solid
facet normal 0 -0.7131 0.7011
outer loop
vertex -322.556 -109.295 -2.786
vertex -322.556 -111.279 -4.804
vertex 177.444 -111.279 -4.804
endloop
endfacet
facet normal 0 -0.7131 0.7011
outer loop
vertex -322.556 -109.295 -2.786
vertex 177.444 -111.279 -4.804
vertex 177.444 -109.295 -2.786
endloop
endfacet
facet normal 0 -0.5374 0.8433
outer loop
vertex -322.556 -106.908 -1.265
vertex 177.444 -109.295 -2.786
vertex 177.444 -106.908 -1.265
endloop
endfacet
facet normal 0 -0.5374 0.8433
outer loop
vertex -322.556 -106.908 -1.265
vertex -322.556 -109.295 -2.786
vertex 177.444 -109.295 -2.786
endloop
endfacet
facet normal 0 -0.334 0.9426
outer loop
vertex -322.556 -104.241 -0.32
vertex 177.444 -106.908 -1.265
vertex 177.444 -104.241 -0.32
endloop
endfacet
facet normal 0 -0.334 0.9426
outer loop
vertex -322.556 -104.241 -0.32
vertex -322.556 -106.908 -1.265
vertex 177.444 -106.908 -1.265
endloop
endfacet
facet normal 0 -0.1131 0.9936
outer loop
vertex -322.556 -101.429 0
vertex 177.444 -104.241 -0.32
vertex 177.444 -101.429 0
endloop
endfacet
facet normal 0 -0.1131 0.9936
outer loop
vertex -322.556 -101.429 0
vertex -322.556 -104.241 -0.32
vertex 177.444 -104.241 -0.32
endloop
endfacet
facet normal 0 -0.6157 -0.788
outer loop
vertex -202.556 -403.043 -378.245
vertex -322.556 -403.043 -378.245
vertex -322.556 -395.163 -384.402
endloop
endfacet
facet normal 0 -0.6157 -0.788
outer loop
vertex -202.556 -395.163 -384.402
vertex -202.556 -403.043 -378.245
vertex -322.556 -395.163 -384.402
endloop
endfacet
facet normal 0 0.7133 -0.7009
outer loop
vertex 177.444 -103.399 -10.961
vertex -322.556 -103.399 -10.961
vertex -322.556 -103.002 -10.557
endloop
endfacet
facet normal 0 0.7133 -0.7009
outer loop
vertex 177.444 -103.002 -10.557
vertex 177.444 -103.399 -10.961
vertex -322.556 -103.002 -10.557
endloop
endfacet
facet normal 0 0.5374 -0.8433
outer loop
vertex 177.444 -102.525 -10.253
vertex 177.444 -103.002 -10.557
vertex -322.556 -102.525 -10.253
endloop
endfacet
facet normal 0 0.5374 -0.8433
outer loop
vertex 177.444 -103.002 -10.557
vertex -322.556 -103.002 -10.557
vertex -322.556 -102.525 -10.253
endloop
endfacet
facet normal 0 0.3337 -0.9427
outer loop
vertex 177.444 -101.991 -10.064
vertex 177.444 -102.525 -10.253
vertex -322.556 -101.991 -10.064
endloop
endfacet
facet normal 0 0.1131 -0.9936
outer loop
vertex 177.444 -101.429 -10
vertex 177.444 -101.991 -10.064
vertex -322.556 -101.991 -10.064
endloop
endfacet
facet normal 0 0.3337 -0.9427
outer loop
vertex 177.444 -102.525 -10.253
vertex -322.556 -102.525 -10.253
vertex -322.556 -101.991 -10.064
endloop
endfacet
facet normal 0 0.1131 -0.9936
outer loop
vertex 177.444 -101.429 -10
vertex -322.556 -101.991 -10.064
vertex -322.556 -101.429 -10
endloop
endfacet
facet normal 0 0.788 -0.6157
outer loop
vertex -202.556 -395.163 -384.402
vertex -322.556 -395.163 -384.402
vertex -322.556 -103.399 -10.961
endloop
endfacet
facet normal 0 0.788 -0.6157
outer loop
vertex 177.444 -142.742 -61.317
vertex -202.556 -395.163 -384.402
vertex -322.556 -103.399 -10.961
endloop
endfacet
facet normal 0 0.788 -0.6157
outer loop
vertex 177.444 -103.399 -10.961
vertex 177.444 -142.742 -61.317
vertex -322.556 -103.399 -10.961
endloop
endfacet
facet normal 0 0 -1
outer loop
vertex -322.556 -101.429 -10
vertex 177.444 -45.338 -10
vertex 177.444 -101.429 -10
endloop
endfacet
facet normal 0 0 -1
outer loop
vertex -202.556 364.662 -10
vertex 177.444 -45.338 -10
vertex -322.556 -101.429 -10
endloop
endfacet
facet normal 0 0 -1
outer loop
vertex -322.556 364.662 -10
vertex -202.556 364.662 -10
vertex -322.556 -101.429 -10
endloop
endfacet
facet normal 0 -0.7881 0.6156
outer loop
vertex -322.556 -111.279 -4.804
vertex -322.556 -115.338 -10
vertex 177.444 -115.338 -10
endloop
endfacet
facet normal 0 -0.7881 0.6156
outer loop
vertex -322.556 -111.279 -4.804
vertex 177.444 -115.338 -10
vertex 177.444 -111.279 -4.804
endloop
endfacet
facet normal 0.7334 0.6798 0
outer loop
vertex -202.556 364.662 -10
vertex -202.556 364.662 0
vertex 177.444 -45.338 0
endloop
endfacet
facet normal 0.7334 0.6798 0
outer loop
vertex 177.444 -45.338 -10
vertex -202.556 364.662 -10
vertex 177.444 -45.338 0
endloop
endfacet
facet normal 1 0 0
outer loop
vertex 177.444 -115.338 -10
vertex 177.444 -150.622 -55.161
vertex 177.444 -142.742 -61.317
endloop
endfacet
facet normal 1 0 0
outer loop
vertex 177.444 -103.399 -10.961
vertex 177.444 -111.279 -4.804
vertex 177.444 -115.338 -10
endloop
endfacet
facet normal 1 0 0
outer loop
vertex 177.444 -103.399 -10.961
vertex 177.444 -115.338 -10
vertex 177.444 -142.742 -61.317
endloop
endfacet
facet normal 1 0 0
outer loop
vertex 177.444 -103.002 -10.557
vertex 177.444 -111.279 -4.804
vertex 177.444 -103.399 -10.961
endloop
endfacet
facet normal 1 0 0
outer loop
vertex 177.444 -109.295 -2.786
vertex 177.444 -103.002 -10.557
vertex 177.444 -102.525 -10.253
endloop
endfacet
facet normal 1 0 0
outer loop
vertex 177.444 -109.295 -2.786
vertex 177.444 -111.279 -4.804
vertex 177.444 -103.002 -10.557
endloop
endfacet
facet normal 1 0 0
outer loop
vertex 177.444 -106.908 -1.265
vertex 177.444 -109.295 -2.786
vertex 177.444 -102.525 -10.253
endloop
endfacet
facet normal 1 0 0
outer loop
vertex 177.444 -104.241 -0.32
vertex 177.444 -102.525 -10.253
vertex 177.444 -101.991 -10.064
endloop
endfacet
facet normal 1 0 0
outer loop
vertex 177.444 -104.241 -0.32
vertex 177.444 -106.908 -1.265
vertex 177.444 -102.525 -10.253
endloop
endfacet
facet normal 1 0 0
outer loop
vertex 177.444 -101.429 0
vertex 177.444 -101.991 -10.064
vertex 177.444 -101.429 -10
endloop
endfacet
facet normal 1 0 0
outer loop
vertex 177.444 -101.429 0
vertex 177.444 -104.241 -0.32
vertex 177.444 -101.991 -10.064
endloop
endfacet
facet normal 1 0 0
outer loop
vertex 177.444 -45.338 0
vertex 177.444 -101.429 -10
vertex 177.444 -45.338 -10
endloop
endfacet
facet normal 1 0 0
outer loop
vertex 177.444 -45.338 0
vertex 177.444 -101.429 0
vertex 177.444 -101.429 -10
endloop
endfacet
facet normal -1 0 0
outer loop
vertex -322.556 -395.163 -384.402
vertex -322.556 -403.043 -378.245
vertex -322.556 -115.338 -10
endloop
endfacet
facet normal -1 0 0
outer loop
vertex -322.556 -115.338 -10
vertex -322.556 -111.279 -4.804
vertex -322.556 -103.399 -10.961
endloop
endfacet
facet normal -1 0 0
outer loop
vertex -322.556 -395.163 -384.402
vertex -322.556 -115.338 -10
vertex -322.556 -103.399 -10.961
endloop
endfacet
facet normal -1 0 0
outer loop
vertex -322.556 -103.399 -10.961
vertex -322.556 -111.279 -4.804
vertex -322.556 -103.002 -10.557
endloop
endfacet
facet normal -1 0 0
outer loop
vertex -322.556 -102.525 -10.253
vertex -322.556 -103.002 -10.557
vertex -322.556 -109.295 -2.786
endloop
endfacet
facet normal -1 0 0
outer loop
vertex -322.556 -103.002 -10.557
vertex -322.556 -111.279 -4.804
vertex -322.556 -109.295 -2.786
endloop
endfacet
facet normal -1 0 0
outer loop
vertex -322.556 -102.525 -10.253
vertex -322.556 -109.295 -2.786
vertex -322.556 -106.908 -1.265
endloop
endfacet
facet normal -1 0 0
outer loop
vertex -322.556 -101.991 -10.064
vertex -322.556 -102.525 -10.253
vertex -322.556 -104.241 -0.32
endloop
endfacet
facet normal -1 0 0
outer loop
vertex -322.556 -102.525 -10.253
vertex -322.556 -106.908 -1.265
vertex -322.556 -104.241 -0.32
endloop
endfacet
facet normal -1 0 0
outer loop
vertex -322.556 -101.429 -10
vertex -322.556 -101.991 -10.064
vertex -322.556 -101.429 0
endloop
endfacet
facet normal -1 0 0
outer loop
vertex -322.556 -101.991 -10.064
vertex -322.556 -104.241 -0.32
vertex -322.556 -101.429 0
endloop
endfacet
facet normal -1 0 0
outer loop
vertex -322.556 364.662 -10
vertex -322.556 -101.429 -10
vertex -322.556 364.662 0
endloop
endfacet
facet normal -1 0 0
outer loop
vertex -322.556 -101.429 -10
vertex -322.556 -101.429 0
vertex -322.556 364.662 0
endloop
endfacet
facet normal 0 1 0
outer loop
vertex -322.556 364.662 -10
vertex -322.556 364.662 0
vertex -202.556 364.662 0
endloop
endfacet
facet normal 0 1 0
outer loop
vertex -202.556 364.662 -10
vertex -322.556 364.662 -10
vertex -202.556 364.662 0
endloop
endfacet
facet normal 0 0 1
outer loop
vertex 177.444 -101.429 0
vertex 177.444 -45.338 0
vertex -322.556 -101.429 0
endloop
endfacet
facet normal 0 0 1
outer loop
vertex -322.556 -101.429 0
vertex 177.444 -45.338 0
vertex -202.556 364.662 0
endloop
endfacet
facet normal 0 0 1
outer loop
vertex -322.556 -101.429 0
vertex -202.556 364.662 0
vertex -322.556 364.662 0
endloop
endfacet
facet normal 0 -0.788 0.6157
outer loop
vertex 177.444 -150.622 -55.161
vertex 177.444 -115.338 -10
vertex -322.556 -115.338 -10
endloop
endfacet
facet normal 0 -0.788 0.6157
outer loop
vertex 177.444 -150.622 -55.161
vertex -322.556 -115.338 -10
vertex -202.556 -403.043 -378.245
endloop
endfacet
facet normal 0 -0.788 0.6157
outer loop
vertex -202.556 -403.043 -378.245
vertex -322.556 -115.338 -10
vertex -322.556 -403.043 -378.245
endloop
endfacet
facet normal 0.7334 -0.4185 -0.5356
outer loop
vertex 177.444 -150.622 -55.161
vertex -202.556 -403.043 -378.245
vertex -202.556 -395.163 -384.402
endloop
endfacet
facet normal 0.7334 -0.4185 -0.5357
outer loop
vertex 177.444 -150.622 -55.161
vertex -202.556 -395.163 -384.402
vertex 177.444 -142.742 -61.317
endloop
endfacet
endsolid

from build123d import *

# Parameters (mm, degrees)
BASE_FLANGE1_DEPTH   = 10
EDGE_FLANGE1_START   = -322.556390977
EDGE_FLANGE1_DEPTH   = 500
EDGE_FLANGE1_2_DEPTH = 500
CUT_EXTRUDE1_DEPTH   = 10


# Read off the part's stored shape, not the designer's step: Edge-Flange1
# Sheet-metal steps are written as plain solids
with BuildPart() as part:
    # Sketch1 → Base-Flange1 (new body)
    with BuildSketch(Plane.XY):
        Polygon((-322.556390977, 364.661654135), (-202.556390977, 364.661654135), (177.443609023, -45.338345865), (177.443609023, -115.338345865), (-322.556390977, -115.338345865), align=None)
    extrude(amount=-BASE_FLANGE1_DEPTH)

    # Edge-Flange1 outline → Edge-Flange1 (cut)
    with BuildSketch(Plane.YZ.offset(EDGE_FLANGE1_START)):
        with BuildLine():
            Line((-115.338345865, -10), (-111.278966663, -4.804231558))
            ThreePointArc((-111.278966663, -4.804231558), (-106.908471578, -1.265074421), (-101.428832243, 0))
            Line((-101.428832243, 0), (-115.338345865, 0))
            Line((-115.338345865, 0), (-115.338345865, -10))
        make_face()
    extrude(amount=EDGE_FLANGE1_DEPTH, mode=Mode.SUBTRACT)

    # Edge-Flange1 2 outline → Edge-Flange1 2 (add)
    with BuildSketch(Plane.YZ.offset(EDGE_FLANGE1_START)):
        with BuildLine():
            Line((-101.428832243, -10), (-115.338345865, -10))
            Line((-115.338345865, -10), (-403.042997756, -378.245161731))
            Line((-403.042997756, -378.245161731), (-395.16289022, -384.401776484))
            Line((-395.16289022, -384.401776484), (-103.398859127, -10.960846312))
            ThreePointArc((-103.398859127, -10.960846312), (-102.52476011, -10.253014884), (-101.428832243, -10))
        make_face()
    extrude(amount=EDGE_FLANGE1_2_DEPTH)

    # Sketch9 → Cut-Extrude1 (cut)
    with BuildSketch(Plane(origin=(0, -66.769129934, 52.165761512), x_dir=(1, 0, 0), z_dir=(0, -0.788010753606719, 0.6156614753256621))):
        Polygon((-202.556390977, -546.199301562), (177.443609023, -136.199301562), (177.443609023, -546.199301562), align=None)
    extrude(amount=-CUT_EXTRUDE1_DEPTH, mode=Mode.SUBTRACT)


solid = part.part
